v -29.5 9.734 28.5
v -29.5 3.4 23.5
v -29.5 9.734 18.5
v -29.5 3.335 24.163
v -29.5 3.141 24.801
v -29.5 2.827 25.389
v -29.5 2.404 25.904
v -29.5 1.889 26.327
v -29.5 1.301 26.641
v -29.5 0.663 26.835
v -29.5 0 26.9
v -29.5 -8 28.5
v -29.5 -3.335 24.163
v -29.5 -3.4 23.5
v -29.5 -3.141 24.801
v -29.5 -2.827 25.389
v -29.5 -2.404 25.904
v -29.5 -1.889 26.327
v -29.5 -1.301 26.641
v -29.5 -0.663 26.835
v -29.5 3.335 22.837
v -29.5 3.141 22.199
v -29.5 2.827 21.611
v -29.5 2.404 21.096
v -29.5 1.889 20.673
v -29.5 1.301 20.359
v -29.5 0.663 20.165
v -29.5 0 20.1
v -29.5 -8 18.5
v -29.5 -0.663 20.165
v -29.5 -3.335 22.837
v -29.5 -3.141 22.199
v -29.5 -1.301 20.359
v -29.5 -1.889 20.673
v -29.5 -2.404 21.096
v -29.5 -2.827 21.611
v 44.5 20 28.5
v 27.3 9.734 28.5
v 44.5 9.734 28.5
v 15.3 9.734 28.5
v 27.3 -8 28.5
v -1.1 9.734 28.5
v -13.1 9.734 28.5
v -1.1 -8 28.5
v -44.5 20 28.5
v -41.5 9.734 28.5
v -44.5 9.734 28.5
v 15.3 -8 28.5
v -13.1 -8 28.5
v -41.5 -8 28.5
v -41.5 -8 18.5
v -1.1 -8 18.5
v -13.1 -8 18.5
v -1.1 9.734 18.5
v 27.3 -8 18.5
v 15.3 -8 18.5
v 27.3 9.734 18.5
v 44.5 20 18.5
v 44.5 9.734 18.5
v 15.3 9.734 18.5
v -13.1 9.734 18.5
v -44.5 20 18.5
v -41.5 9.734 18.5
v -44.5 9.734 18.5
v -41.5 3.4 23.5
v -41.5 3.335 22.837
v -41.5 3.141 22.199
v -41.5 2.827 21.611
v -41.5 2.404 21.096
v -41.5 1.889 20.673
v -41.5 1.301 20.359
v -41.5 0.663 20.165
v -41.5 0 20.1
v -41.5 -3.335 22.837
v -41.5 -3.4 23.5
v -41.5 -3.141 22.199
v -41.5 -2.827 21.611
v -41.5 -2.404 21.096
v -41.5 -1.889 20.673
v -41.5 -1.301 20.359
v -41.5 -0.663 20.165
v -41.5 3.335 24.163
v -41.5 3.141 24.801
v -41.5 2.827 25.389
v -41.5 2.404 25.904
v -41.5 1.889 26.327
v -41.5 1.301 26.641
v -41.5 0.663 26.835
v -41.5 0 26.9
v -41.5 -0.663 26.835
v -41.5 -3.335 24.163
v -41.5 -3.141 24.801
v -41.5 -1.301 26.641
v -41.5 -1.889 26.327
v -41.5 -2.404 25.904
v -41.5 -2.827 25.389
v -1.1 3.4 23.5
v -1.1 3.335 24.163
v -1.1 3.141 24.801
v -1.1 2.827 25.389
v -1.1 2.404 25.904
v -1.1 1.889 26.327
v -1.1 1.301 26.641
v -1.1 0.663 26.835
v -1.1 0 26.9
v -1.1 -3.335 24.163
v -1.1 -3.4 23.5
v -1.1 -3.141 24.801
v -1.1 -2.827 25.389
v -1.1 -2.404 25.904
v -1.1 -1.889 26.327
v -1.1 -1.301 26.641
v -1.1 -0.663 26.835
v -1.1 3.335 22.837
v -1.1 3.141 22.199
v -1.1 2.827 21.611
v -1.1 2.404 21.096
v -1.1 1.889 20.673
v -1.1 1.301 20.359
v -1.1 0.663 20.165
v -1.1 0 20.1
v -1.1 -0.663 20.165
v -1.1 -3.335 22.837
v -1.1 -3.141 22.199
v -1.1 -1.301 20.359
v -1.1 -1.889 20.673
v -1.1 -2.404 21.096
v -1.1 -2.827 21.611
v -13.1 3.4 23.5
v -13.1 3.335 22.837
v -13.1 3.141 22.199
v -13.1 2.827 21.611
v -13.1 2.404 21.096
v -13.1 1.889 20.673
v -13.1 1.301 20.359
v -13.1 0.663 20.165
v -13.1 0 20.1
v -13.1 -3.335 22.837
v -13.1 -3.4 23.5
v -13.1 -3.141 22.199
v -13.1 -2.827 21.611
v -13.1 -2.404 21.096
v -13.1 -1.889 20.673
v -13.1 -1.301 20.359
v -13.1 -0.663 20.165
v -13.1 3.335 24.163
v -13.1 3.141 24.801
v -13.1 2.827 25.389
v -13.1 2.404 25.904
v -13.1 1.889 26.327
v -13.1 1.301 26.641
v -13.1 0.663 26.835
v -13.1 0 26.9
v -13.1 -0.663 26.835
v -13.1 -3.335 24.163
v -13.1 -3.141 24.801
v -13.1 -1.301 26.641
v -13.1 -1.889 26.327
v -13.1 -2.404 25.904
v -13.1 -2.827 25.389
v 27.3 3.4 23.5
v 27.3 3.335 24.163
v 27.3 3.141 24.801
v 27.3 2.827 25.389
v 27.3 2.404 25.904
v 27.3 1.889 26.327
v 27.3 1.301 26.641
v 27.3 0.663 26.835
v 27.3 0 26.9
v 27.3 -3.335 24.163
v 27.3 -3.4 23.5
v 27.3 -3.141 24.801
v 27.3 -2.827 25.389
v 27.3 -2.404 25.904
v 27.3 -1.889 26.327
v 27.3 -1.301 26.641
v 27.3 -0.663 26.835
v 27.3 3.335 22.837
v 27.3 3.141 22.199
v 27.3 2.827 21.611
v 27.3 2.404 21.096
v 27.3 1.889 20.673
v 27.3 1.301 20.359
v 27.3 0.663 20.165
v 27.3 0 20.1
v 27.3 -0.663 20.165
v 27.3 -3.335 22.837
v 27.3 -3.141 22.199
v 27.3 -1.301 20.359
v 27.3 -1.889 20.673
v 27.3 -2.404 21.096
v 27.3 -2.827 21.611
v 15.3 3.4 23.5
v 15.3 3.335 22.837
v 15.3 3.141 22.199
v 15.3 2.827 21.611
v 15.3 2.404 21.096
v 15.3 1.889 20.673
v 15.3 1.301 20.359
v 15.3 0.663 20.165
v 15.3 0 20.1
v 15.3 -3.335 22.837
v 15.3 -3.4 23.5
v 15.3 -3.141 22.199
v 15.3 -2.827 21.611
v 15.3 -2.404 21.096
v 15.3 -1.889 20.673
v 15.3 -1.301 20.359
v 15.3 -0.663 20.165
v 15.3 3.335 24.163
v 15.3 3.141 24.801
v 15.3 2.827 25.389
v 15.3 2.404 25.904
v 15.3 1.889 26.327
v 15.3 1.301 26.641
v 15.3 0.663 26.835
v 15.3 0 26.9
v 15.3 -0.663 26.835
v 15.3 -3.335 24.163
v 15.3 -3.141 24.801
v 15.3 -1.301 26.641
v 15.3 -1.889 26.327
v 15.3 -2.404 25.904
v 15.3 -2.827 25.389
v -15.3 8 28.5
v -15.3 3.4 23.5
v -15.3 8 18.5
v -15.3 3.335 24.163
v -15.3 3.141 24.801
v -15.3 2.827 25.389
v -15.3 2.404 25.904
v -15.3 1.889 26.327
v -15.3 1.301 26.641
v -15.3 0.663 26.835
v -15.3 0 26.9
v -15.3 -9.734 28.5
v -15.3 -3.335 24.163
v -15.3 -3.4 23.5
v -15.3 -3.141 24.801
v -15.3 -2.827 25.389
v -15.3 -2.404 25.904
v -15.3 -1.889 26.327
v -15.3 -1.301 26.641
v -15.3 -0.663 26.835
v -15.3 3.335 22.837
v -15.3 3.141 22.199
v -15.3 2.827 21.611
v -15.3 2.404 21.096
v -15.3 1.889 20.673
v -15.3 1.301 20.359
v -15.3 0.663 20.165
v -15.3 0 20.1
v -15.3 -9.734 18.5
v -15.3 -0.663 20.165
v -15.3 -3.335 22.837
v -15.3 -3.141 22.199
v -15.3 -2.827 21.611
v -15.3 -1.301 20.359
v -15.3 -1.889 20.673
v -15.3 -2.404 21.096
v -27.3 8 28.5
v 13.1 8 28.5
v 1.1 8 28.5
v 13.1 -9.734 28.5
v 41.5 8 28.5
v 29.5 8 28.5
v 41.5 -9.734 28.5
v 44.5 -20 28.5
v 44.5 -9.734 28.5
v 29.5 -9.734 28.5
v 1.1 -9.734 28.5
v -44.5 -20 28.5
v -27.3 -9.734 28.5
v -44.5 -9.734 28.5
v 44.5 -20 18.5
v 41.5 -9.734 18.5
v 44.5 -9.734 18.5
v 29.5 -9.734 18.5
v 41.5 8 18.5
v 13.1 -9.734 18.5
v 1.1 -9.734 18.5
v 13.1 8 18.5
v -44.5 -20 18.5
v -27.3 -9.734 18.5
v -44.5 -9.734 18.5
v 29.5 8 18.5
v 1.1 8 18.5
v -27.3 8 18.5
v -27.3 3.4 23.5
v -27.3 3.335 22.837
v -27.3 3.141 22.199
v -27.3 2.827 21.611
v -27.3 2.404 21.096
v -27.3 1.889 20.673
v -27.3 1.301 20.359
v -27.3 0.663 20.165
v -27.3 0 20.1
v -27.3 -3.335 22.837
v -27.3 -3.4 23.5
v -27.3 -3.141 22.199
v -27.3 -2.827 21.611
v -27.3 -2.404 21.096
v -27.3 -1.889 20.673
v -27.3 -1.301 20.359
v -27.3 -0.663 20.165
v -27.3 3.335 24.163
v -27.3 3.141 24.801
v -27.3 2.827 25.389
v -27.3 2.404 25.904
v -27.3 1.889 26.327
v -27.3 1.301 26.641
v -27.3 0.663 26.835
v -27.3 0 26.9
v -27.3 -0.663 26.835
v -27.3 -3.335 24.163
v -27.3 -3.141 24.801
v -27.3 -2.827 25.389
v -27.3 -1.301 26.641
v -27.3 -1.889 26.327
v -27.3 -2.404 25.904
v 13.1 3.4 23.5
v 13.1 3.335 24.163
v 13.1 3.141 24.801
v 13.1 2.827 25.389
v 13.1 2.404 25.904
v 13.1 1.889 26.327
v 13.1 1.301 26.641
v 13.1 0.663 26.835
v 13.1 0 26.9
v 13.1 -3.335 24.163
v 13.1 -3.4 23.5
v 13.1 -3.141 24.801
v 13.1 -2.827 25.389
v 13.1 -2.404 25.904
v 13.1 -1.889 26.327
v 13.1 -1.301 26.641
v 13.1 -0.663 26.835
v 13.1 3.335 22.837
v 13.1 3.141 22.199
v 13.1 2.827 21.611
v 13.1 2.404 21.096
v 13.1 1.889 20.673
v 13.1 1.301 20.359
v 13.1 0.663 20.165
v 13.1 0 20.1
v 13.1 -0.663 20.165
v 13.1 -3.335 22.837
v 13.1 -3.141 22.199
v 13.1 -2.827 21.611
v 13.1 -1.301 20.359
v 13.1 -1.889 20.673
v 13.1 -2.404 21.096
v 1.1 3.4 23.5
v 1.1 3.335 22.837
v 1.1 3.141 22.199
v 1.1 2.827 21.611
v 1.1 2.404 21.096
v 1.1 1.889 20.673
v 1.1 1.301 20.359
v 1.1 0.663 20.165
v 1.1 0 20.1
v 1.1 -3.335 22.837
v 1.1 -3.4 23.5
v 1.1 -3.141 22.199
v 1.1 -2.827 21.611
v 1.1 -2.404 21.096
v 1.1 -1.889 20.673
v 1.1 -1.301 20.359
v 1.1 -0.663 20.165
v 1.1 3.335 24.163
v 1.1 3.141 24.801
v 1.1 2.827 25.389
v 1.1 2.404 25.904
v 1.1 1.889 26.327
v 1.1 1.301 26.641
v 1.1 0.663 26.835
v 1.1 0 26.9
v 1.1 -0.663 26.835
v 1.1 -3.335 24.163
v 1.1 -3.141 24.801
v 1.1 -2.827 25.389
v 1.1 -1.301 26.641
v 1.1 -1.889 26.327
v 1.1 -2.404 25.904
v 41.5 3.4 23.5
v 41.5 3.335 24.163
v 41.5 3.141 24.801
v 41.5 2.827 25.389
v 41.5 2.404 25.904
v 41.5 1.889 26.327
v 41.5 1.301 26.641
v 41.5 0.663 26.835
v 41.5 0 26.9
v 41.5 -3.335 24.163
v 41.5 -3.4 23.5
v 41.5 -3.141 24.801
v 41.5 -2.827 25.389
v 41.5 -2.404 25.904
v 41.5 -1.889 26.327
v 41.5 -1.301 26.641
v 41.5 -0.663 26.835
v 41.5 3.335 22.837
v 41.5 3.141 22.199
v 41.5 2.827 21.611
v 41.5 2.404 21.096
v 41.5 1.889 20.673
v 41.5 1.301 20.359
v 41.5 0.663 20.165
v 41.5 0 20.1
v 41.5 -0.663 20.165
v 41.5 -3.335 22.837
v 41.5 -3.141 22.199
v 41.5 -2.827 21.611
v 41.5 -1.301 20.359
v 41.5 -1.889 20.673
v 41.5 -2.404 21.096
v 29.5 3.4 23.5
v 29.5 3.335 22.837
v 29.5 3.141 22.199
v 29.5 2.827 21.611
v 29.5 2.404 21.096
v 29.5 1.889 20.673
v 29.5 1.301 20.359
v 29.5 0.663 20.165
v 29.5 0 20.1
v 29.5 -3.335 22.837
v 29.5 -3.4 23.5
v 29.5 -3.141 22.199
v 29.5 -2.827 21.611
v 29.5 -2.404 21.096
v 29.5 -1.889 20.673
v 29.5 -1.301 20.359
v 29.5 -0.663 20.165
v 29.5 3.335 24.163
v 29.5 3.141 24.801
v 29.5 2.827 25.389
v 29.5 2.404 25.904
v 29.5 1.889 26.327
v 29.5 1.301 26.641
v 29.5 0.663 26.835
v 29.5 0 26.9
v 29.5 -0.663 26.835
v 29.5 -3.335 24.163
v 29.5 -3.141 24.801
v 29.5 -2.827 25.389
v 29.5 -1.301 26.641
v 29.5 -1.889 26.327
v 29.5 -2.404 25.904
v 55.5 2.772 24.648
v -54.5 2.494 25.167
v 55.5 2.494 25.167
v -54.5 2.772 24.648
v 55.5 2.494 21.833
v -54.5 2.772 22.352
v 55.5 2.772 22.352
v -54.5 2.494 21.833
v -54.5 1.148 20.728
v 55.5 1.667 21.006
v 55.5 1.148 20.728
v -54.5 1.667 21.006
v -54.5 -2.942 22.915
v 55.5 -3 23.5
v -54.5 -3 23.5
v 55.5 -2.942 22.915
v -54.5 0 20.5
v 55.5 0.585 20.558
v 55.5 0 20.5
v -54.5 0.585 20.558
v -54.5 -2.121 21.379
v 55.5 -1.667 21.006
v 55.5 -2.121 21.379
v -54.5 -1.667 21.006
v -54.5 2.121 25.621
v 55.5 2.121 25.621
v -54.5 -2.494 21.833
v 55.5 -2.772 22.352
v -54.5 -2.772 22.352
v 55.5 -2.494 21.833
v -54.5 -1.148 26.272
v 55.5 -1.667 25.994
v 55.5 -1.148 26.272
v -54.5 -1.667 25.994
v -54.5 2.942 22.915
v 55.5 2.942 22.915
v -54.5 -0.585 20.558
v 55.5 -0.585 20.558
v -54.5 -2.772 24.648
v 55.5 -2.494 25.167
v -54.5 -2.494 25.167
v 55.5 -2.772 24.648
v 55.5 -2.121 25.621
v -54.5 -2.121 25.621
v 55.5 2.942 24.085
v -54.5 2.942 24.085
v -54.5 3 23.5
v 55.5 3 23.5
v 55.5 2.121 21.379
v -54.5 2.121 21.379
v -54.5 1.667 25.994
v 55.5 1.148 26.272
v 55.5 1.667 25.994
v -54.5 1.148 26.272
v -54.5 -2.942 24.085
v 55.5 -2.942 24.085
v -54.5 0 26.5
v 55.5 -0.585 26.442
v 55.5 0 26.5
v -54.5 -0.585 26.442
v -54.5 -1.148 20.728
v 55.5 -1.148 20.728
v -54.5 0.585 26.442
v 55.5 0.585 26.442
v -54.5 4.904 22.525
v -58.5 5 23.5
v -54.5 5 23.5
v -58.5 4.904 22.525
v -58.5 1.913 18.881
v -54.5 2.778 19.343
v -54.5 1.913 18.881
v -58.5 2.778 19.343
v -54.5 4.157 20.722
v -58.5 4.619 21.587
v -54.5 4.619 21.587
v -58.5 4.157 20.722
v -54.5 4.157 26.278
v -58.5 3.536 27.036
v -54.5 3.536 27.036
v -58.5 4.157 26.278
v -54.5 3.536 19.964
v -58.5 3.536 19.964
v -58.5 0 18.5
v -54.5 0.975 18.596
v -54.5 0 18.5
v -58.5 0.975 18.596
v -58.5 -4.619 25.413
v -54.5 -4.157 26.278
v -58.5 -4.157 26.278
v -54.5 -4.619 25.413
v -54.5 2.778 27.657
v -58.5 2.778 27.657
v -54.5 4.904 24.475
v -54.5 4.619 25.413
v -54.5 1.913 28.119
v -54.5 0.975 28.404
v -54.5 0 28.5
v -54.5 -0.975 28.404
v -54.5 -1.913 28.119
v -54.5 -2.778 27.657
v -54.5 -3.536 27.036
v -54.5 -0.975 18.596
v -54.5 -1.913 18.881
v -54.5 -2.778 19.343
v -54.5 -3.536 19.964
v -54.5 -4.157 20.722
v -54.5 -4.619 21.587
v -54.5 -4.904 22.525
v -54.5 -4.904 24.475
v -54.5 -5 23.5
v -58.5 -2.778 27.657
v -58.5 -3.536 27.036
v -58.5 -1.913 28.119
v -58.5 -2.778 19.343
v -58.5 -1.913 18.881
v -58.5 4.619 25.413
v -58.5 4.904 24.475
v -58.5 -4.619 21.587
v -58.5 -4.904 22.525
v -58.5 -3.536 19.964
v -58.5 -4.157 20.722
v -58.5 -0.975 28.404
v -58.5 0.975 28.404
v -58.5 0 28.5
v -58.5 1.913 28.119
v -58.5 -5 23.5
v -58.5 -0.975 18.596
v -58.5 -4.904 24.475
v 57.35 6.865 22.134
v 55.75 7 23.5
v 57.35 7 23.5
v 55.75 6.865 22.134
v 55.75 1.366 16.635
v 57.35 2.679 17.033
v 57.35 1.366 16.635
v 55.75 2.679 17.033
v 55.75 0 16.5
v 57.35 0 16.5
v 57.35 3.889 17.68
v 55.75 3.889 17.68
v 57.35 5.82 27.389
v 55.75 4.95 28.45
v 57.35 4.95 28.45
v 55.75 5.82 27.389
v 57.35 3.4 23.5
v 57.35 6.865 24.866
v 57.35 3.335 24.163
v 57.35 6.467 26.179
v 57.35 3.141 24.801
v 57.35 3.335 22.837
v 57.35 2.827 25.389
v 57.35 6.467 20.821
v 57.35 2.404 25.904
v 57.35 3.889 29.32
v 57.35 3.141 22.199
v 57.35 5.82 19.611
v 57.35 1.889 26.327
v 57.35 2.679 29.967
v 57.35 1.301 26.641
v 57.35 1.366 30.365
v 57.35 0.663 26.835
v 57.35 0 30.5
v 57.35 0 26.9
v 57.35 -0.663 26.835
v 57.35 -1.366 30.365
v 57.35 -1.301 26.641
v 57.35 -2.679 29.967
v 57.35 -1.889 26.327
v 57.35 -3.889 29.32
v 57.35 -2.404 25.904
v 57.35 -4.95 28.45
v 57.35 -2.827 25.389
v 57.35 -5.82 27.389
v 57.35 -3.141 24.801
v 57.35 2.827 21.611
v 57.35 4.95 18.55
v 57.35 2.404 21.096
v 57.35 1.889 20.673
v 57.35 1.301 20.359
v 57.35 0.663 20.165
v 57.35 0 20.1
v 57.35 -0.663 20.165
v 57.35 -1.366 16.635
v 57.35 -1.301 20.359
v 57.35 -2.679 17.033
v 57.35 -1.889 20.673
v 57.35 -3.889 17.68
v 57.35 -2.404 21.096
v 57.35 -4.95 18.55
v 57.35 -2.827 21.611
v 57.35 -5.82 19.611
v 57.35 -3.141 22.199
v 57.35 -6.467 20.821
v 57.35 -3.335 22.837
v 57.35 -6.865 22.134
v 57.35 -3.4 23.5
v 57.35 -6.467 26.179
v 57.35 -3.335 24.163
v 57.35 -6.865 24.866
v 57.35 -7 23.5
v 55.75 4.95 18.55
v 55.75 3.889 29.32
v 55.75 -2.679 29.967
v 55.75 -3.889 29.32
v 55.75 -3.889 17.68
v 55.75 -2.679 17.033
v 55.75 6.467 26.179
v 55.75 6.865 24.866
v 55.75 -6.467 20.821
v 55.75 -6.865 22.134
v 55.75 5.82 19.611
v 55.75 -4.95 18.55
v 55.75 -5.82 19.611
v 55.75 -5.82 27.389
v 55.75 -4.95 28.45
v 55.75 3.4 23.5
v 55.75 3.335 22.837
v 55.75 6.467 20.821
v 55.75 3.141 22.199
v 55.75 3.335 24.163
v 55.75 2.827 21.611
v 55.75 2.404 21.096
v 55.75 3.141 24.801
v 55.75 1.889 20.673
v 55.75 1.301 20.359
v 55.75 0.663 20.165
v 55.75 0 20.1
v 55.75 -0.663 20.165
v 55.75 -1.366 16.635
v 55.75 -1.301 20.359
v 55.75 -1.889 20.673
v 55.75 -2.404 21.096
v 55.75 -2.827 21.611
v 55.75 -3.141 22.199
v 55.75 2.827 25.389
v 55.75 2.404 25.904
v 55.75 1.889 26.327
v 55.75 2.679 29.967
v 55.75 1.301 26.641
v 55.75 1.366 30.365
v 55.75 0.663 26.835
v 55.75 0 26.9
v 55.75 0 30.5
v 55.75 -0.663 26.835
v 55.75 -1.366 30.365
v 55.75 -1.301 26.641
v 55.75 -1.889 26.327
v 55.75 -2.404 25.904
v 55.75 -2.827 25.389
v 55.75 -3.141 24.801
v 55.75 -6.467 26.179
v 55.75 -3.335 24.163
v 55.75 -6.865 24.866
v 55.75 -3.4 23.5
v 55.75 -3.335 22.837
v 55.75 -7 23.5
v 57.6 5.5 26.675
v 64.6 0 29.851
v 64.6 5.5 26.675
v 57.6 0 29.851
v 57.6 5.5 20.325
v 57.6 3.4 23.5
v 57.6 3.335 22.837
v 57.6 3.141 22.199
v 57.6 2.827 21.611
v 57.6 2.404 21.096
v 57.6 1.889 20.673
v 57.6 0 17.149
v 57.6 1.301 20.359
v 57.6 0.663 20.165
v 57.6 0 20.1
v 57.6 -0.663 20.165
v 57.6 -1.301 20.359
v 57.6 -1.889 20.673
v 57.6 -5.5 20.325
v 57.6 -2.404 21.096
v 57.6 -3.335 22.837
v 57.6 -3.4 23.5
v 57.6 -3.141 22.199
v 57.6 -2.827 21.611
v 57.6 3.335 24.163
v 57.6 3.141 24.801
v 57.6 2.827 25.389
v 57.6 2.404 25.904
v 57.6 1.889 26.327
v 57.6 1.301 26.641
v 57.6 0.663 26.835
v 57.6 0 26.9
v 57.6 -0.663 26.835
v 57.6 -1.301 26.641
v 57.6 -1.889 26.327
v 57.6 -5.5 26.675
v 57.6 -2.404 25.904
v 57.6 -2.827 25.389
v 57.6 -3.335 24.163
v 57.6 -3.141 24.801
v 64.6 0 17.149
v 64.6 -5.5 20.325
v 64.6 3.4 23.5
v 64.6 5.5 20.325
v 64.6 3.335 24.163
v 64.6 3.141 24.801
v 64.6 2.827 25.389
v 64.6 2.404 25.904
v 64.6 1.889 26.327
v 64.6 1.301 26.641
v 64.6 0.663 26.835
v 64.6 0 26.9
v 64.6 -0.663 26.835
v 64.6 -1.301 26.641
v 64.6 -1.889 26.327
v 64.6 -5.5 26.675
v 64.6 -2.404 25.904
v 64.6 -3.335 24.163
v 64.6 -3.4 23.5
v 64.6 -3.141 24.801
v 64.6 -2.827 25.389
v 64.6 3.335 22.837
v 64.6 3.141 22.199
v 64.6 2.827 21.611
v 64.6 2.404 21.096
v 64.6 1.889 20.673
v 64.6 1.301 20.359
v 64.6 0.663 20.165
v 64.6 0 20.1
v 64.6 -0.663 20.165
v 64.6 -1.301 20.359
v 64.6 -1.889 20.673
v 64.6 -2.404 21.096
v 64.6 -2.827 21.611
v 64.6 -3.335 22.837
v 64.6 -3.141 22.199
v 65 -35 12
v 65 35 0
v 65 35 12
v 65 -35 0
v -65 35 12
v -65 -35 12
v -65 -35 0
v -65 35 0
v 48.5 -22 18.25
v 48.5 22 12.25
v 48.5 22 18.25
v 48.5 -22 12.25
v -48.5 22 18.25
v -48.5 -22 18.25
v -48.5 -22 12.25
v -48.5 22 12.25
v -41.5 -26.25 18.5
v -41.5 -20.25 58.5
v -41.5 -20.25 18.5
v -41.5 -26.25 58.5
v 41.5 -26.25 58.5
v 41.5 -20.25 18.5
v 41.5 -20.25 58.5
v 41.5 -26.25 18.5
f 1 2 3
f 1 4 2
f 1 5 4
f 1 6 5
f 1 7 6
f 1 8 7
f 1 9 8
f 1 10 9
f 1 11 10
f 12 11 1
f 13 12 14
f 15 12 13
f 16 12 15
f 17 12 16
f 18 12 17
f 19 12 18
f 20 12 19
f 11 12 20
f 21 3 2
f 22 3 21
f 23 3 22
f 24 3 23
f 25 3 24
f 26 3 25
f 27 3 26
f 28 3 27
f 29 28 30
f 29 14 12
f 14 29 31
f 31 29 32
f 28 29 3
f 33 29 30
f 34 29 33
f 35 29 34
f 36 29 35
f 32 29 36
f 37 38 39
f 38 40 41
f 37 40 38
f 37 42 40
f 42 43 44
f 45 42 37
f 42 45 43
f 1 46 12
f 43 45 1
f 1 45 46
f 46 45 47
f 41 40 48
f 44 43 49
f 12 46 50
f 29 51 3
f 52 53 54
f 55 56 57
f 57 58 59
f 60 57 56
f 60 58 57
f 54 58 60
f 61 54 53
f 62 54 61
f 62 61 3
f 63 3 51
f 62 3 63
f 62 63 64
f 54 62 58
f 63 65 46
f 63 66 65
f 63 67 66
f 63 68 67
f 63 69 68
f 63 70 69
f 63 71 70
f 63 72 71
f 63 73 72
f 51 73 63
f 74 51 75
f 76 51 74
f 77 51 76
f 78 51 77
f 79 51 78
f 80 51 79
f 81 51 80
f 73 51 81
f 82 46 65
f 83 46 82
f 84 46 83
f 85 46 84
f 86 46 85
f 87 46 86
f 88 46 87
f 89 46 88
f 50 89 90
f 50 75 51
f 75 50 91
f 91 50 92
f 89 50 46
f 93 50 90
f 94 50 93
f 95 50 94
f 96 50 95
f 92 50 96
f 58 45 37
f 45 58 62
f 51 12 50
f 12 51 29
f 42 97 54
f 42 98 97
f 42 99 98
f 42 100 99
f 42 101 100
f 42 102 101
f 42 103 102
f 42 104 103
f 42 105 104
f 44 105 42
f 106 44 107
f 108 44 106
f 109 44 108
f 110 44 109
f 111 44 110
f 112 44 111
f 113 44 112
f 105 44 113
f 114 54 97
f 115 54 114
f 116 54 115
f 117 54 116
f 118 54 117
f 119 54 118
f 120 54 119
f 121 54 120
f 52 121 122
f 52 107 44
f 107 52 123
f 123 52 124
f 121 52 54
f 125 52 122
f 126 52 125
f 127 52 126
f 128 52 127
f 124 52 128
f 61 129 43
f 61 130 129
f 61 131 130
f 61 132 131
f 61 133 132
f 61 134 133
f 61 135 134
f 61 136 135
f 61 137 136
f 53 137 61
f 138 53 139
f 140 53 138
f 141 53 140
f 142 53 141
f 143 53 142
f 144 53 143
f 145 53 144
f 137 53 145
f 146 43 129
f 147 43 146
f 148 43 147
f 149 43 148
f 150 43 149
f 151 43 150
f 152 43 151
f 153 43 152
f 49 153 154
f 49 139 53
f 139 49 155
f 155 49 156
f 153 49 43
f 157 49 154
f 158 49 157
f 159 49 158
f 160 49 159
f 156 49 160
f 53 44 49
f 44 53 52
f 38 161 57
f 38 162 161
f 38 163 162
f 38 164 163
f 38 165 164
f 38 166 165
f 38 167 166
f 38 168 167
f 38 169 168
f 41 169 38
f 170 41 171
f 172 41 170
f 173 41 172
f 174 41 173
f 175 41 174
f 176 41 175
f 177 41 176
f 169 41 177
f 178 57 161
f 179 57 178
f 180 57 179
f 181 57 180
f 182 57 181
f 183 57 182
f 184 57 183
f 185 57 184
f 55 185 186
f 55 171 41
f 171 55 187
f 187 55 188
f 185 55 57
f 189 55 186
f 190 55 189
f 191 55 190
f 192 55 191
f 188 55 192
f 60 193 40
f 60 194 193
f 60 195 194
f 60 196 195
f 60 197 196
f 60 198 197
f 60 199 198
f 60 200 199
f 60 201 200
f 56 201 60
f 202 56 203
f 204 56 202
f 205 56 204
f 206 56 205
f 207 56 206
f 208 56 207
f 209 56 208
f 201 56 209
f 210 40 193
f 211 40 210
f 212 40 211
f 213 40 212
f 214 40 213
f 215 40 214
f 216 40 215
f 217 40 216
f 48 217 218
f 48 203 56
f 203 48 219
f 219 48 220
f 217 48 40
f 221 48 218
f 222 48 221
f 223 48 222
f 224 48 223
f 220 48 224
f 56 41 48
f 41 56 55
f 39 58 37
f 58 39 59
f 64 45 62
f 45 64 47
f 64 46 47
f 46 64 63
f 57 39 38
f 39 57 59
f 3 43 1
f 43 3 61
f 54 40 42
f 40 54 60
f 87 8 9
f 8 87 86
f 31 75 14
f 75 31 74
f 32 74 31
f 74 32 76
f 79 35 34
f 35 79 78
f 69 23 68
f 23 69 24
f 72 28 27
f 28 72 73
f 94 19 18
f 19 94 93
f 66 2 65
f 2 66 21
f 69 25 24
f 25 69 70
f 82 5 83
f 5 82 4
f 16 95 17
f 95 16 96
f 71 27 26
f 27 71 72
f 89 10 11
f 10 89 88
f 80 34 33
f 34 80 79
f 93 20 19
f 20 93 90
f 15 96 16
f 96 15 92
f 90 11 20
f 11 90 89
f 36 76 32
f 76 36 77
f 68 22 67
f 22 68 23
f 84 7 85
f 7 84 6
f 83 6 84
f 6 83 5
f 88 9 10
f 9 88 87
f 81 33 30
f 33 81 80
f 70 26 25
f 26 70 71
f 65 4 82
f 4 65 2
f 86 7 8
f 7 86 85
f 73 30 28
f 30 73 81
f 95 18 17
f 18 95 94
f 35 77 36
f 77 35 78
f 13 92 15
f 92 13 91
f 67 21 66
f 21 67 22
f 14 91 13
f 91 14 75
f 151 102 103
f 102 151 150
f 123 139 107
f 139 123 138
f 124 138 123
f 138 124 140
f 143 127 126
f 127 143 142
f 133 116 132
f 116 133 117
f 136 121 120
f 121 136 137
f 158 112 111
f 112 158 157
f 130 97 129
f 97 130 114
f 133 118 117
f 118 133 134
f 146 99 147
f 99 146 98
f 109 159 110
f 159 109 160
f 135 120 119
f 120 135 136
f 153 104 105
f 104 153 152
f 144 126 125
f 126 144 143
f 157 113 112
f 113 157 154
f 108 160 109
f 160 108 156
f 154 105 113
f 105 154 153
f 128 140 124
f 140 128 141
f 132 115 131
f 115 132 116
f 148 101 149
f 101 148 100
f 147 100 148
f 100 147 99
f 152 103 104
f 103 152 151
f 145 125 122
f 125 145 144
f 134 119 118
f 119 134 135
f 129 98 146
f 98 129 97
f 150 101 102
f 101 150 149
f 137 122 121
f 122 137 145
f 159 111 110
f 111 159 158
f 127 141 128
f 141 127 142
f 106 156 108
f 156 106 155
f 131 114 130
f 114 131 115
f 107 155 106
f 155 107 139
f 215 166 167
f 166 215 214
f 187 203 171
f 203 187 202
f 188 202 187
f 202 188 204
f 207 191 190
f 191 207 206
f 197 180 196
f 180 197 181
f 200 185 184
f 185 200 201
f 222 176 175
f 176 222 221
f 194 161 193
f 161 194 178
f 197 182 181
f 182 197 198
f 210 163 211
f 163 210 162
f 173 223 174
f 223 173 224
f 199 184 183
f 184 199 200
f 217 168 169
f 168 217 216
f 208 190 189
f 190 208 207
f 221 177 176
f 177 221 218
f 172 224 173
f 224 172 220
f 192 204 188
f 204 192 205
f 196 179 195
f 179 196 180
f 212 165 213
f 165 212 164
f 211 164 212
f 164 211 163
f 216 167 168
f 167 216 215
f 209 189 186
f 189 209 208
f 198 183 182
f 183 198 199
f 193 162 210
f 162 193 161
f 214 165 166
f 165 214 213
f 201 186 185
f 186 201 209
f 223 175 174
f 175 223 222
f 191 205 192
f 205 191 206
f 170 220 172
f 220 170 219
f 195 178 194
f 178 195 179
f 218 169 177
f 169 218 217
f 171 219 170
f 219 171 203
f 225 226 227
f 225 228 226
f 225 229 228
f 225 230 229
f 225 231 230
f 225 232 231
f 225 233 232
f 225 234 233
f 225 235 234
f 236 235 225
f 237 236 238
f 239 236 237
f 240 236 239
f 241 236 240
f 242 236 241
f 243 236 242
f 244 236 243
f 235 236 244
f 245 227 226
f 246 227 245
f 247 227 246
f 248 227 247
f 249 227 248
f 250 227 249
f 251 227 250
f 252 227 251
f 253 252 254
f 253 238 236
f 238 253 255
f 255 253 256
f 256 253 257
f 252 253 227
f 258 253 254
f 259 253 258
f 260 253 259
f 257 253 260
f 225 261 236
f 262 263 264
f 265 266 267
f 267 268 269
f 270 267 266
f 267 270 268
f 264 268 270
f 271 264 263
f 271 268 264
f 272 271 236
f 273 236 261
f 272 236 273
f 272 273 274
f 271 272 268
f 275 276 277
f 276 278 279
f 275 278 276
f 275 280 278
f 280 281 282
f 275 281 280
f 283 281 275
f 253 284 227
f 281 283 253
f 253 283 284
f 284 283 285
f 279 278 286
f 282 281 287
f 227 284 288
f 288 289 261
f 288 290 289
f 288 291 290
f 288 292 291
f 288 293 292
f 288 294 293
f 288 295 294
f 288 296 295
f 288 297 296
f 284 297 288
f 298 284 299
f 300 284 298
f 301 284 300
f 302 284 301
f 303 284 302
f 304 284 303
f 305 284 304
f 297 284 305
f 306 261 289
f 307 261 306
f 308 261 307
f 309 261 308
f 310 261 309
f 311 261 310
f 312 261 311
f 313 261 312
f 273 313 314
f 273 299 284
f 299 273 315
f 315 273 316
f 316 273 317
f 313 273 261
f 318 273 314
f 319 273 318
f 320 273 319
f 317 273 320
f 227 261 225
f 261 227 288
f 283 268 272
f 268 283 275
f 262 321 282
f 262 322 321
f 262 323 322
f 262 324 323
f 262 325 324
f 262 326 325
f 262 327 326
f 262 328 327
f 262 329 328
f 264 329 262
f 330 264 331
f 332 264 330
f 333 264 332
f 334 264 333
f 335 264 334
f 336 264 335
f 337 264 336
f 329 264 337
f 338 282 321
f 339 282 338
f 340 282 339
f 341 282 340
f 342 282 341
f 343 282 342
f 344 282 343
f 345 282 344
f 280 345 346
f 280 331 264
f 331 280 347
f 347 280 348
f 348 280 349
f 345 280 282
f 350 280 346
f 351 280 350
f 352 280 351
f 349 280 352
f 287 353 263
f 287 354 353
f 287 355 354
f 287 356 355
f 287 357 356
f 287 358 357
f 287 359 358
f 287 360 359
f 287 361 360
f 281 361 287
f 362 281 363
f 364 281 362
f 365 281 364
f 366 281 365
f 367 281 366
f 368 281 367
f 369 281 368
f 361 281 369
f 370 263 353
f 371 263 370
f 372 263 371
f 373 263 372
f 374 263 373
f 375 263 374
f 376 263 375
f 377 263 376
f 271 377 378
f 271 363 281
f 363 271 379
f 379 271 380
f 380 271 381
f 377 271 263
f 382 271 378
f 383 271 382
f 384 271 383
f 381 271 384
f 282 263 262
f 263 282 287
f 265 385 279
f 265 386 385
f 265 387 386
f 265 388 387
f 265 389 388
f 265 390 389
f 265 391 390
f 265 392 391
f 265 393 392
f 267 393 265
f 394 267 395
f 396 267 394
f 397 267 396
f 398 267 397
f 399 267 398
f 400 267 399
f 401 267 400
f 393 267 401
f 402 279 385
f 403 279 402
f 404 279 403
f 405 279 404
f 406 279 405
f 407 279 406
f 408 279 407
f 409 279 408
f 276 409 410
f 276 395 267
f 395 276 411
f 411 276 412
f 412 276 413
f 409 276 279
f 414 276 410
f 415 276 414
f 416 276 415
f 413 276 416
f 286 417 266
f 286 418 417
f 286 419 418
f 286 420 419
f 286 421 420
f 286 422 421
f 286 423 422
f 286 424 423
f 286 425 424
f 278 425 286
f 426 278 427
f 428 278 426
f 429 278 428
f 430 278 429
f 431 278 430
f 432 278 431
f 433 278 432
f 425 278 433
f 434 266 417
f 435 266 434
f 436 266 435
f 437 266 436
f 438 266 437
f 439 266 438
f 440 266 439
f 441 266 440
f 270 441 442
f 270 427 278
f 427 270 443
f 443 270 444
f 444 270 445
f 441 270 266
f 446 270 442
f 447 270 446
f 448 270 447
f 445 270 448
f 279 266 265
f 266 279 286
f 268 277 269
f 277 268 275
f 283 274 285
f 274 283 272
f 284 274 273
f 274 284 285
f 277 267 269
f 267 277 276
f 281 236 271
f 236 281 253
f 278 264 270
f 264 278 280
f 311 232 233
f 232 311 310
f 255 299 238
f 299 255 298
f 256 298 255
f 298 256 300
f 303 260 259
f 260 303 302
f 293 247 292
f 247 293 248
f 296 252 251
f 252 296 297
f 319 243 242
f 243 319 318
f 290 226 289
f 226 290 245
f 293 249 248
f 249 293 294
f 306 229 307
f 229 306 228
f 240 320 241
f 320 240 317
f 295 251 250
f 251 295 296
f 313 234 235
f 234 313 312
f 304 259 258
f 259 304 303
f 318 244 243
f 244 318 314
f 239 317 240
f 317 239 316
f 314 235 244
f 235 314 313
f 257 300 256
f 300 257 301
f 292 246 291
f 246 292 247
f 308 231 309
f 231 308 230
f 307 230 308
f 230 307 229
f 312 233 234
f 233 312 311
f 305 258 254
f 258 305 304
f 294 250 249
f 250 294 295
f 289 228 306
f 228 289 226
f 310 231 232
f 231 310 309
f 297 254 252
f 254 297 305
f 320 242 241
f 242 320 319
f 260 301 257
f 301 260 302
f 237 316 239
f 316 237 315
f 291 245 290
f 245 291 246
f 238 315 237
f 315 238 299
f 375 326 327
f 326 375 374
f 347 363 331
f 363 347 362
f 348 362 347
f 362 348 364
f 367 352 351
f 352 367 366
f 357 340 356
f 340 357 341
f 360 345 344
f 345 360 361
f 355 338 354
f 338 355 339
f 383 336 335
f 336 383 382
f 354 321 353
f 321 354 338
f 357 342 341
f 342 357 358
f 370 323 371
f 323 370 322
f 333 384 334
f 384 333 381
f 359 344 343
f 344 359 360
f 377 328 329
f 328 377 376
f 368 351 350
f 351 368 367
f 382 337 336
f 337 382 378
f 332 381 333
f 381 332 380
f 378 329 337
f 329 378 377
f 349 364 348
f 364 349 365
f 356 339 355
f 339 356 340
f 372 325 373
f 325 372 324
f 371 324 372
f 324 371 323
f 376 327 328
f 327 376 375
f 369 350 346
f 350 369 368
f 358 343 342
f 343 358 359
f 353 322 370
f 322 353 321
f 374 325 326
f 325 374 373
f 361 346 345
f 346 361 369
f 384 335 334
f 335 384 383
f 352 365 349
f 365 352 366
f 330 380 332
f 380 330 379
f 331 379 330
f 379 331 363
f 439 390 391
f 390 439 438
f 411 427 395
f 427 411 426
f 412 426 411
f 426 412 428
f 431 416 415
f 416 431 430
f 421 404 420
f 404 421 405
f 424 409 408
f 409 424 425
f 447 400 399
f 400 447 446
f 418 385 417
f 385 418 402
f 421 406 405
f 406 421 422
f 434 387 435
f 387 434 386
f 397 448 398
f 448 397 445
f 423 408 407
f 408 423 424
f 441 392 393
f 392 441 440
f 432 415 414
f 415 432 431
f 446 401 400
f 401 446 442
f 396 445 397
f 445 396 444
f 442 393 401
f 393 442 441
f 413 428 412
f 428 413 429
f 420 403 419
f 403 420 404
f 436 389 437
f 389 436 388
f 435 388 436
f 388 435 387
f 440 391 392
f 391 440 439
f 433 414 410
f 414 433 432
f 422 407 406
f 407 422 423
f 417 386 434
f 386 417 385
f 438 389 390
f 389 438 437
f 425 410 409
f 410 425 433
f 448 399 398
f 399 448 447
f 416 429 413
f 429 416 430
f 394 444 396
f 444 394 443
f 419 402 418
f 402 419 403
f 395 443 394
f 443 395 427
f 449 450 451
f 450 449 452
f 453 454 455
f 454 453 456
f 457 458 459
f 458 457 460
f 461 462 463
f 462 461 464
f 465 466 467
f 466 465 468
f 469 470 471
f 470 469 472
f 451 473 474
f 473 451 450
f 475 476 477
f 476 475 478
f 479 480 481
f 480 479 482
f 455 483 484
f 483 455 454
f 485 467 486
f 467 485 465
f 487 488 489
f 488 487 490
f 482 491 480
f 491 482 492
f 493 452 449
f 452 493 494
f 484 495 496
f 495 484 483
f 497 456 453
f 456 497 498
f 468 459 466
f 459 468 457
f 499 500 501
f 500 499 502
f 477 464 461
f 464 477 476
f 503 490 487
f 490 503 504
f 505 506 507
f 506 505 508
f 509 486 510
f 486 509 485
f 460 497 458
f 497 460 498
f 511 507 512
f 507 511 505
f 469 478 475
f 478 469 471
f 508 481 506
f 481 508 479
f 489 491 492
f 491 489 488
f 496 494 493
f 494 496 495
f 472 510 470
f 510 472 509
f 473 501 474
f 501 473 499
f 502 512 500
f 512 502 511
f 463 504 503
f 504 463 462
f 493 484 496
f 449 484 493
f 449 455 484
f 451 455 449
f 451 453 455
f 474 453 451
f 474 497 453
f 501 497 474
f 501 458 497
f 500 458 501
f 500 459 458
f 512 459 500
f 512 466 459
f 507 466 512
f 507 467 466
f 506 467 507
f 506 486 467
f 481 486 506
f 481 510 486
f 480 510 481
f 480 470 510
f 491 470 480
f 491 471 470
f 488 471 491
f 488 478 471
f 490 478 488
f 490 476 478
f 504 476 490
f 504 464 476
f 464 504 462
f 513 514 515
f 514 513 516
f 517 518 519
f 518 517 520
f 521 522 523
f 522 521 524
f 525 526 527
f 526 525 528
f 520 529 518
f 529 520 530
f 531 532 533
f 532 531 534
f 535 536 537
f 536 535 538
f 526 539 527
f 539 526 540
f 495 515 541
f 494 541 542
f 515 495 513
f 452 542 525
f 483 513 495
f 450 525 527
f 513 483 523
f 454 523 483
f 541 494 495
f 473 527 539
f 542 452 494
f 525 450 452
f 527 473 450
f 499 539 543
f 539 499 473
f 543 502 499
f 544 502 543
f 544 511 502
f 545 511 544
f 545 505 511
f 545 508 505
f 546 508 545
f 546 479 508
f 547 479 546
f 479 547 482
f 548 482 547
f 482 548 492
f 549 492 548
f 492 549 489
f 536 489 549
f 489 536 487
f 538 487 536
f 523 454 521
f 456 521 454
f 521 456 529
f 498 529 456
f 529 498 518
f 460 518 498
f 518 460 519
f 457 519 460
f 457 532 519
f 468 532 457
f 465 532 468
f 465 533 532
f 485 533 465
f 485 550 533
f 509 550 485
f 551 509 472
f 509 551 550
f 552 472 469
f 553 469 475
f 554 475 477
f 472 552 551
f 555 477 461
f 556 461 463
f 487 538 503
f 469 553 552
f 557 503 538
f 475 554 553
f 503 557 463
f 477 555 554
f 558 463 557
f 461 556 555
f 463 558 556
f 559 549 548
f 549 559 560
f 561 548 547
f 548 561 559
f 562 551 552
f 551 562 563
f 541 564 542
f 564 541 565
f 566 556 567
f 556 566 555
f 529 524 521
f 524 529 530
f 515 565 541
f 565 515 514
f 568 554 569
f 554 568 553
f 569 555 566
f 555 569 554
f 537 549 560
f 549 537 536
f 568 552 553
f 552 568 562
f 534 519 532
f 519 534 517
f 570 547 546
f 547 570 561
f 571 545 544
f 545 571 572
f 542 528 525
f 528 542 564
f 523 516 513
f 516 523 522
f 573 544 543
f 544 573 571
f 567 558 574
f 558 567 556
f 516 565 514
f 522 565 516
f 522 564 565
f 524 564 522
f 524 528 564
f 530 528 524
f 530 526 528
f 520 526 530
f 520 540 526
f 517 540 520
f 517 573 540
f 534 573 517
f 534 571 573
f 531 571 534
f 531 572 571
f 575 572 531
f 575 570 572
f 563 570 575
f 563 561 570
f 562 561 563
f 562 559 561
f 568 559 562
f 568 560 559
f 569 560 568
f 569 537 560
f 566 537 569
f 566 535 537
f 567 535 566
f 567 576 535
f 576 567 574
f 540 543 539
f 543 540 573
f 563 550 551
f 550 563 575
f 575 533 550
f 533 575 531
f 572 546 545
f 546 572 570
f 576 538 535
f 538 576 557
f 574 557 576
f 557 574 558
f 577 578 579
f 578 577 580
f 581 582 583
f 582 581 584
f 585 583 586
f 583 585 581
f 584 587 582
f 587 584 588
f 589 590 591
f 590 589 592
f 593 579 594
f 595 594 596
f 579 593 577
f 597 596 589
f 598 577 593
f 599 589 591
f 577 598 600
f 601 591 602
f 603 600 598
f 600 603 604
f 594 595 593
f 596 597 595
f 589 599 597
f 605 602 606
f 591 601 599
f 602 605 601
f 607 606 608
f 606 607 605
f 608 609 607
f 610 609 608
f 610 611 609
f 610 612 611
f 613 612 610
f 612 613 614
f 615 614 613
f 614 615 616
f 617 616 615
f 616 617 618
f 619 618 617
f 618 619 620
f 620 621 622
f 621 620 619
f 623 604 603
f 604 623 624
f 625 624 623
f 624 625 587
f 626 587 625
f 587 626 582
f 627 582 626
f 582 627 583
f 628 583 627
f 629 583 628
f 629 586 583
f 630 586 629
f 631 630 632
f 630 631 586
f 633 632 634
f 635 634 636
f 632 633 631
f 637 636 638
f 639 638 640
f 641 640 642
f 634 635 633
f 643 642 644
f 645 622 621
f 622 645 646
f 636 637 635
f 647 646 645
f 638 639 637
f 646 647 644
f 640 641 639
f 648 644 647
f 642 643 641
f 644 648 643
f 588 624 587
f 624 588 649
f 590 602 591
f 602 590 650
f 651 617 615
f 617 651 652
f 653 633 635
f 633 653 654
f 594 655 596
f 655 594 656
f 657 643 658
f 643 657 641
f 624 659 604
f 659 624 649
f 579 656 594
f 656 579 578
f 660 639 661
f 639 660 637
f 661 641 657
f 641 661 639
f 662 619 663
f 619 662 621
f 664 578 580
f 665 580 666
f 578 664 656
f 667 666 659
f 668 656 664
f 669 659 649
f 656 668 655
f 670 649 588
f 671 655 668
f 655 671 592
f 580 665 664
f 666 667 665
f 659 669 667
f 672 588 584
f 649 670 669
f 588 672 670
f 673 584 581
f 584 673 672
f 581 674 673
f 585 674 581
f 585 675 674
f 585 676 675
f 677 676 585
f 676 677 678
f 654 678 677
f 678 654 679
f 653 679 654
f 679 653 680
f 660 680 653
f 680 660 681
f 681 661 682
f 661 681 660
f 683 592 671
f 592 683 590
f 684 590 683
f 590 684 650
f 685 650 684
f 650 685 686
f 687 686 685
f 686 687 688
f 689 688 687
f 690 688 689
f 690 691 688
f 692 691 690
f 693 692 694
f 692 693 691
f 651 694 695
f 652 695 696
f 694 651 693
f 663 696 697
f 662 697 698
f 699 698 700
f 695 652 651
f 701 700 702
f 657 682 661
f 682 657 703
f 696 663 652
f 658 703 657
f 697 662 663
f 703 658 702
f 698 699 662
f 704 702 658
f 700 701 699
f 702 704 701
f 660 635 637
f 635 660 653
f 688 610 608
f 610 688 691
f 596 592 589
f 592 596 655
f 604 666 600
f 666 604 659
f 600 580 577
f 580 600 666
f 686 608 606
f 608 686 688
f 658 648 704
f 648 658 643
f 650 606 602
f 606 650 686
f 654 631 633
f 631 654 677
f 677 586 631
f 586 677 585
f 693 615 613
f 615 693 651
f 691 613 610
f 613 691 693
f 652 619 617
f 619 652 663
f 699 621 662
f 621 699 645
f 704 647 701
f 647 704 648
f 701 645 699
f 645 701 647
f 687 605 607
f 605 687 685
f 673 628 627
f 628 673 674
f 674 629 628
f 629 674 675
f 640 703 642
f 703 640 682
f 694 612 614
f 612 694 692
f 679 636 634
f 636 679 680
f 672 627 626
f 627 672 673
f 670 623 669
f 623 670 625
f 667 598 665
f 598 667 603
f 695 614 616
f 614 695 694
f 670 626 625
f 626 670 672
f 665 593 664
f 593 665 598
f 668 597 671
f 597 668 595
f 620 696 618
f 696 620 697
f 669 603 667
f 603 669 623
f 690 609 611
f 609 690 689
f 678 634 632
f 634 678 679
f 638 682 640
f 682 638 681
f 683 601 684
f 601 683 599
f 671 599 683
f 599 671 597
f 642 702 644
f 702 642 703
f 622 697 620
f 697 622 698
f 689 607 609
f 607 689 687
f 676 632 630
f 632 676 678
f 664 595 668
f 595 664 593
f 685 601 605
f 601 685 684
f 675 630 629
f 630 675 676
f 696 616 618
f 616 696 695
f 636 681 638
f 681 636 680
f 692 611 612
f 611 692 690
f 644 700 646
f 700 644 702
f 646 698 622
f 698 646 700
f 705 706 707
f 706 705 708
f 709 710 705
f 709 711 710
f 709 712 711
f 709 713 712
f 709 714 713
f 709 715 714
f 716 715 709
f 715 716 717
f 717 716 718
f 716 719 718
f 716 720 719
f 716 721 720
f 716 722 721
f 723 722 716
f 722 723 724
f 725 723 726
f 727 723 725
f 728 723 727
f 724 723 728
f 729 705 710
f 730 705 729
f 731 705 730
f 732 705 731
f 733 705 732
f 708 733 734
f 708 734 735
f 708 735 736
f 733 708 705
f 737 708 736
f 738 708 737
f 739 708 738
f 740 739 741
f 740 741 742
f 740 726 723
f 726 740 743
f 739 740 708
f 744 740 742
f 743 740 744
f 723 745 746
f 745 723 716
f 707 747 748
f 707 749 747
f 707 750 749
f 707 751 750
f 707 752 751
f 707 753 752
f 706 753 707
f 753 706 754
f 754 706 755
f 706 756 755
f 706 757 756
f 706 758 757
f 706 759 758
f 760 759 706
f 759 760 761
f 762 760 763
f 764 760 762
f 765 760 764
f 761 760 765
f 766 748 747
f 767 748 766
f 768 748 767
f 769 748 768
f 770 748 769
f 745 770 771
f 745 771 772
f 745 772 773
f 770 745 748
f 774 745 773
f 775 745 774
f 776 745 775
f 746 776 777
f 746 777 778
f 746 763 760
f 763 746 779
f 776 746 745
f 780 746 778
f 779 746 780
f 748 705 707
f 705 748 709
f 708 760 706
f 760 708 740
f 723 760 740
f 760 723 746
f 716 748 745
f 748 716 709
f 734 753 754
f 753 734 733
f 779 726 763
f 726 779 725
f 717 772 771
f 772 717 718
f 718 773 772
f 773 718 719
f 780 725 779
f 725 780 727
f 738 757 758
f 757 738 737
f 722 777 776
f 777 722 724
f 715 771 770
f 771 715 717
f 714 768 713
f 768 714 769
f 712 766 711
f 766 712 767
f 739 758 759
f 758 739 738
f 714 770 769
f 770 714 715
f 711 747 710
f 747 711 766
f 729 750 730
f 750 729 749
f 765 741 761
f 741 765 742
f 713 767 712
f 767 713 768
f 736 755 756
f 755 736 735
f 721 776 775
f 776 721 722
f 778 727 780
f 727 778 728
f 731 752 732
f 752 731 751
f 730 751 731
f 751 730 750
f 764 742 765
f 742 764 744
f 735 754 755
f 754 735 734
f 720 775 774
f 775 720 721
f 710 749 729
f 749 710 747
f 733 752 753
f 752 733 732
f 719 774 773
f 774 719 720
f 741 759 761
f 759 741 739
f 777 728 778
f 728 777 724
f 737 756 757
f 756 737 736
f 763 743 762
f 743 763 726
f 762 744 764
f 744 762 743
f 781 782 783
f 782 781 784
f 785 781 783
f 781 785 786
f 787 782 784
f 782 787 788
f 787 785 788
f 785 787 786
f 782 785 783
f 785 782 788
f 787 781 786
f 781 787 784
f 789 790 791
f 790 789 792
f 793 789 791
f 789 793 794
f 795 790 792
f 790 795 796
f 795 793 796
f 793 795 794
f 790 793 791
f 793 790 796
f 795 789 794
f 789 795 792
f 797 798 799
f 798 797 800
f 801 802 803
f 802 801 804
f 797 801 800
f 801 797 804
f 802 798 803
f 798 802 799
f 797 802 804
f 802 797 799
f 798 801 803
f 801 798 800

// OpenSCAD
$fn = 32;

// ------------------------------------------------------------------------
// Comb hinge with flap: leaf 89 x 20 mm, pin d6, flap 40 mm
// Every part is its own module, assembly() places every instance.
// ------------------------------------------------------------------------

// --- part 1 ---
module hinge_bed() {
  difference() {
    translate([-65, -35, 0]) cube([130, 70, 12]);
  }
}

// --- part 2 ---
module hinge_riser() {
  difference() {
    translate([-48.5, -22, 0]) cube([97, 44, 6]);
  }
}

// --- part 3 ---
module hinge_leaf_a() {
  difference() {
    union() {
      translate([-41.5, -8, -5]) cube([12, 28, 10]);
      translate([-13.1, -8, -5]) cube([12, 28, 10]);
      translate([15.3, -8, -5]) cube([12, 28, 10]);
      translate([-44.5, 9.734, -5]) cube([89, 10.266, 10]);
    }
    translate([-35.5, 0, 0]) rotate([0, 90, 0]) cylinder(h = 14, d = 6.8, center = true);
    translate([-7.1, 0, 0]) rotate([0, 90, 0]) cylinder(h = 14, d = 6.8, center = true);
    translate([21.3, 0, 0]) rotate([0, 90, 0]) cylinder(h = 14, d = 6.8, center = true);
  }
}

// --- part 4 ---
module hinge_leaf_b() {
  difference() {
    union() {
      translate([-27.3, -20, -5]) cube([12, 28, 10]);
      translate([1.1, -20, -5]) cube([12, 28, 10]);
      translate([29.5, -20, -5]) cube([12, 28, 10]);
      translate([-44.5, -20, -5]) cube([89, 10.266, 10]);
    }
    translate([-21.3, 0, 0]) rotate([0, 90, 0]) cylinder(h = 14, d = 6.8, center = true);
    translate([7.1, 0, 0]) rotate([0, 90, 0]) cylinder(h = 14, d = 6.8, center = true);
    translate([35.5, 0, 0]) rotate([0, 90, 0]) cylinder(h = 14, d = 6.8, center = true);
  }
}

// --- part 5 ---
module hinge_flap() {
  difference() {
    translate([-41.5, -20, 0]) cube([83, 40, 6]);
  }
}

// --- part 6 ---
module hinge_pin() {
  rotate([0, 90, 0]) cylinder(h = 111, d = 6, center = true);
  translate([-58.5, 0, 0]) rotate([0, 90, 0]) cylinder(h = 4, d = 10);
}

// --- part 7 ---
module pin_washer() {
  difference() {
      translate([0, 0, 0]) cylinder(h = 1.6, d = 14);
      translate([0, 0, -1]) cylinder(h = 3.6, d = 6.8);
    }
}

// --- part 8 ---
module pin_nut() {
  difference() {
    linear_extrude(height = 7) polygon(points = [[6.351, 0], [3.175, 5.5], [-3.175, 5.5], [-6.351, 0], [-3.175, -5.5], [3.175, -5.5]]);
    translate([0, 0, -1]) cylinder(h = 9, d = 6.8);
  }
}

// --- assembly ---
module assembly() {
  color([0.80, 0.24, 0.20]) translate([0, 0, 0]) rotate([0, 0, 0]) hinge_bed();
  color([0.20, 0.45, 0.75]) translate([0, 0, 12.25]) rotate([0, 0, 0]) hinge_riser();
  color([0.25, 0.62, 0.32]) translate([0, 0, 23.5]) rotate([0, 0, 0]) hinge_leaf_a();
  color([0.92, 0.70, 0.18]) translate([0, 0, 23.5]) rotate([0, 0, 0]) hinge_leaf_b();
  color([0.58, 0.35, 0.70]) translate([0, -20.25, 38.5]) rotate([90, 0, 0]) hinge_flap();
  color([0.16, 0.66, 0.66]) translate([0, 0, 23.5]) rotate([0, 0, 0]) hinge_pin();
  color([0.85, 0.48, 0.18]) translate([55.75, 0, 23.5]) rotate([0, 90, 0]) pin_washer();
  color([0.55, 0.60, 0.65]) translate([57.6, 0, 23.5]) rotate([0, 90, 0]) pin_nut();
}

assembly();
